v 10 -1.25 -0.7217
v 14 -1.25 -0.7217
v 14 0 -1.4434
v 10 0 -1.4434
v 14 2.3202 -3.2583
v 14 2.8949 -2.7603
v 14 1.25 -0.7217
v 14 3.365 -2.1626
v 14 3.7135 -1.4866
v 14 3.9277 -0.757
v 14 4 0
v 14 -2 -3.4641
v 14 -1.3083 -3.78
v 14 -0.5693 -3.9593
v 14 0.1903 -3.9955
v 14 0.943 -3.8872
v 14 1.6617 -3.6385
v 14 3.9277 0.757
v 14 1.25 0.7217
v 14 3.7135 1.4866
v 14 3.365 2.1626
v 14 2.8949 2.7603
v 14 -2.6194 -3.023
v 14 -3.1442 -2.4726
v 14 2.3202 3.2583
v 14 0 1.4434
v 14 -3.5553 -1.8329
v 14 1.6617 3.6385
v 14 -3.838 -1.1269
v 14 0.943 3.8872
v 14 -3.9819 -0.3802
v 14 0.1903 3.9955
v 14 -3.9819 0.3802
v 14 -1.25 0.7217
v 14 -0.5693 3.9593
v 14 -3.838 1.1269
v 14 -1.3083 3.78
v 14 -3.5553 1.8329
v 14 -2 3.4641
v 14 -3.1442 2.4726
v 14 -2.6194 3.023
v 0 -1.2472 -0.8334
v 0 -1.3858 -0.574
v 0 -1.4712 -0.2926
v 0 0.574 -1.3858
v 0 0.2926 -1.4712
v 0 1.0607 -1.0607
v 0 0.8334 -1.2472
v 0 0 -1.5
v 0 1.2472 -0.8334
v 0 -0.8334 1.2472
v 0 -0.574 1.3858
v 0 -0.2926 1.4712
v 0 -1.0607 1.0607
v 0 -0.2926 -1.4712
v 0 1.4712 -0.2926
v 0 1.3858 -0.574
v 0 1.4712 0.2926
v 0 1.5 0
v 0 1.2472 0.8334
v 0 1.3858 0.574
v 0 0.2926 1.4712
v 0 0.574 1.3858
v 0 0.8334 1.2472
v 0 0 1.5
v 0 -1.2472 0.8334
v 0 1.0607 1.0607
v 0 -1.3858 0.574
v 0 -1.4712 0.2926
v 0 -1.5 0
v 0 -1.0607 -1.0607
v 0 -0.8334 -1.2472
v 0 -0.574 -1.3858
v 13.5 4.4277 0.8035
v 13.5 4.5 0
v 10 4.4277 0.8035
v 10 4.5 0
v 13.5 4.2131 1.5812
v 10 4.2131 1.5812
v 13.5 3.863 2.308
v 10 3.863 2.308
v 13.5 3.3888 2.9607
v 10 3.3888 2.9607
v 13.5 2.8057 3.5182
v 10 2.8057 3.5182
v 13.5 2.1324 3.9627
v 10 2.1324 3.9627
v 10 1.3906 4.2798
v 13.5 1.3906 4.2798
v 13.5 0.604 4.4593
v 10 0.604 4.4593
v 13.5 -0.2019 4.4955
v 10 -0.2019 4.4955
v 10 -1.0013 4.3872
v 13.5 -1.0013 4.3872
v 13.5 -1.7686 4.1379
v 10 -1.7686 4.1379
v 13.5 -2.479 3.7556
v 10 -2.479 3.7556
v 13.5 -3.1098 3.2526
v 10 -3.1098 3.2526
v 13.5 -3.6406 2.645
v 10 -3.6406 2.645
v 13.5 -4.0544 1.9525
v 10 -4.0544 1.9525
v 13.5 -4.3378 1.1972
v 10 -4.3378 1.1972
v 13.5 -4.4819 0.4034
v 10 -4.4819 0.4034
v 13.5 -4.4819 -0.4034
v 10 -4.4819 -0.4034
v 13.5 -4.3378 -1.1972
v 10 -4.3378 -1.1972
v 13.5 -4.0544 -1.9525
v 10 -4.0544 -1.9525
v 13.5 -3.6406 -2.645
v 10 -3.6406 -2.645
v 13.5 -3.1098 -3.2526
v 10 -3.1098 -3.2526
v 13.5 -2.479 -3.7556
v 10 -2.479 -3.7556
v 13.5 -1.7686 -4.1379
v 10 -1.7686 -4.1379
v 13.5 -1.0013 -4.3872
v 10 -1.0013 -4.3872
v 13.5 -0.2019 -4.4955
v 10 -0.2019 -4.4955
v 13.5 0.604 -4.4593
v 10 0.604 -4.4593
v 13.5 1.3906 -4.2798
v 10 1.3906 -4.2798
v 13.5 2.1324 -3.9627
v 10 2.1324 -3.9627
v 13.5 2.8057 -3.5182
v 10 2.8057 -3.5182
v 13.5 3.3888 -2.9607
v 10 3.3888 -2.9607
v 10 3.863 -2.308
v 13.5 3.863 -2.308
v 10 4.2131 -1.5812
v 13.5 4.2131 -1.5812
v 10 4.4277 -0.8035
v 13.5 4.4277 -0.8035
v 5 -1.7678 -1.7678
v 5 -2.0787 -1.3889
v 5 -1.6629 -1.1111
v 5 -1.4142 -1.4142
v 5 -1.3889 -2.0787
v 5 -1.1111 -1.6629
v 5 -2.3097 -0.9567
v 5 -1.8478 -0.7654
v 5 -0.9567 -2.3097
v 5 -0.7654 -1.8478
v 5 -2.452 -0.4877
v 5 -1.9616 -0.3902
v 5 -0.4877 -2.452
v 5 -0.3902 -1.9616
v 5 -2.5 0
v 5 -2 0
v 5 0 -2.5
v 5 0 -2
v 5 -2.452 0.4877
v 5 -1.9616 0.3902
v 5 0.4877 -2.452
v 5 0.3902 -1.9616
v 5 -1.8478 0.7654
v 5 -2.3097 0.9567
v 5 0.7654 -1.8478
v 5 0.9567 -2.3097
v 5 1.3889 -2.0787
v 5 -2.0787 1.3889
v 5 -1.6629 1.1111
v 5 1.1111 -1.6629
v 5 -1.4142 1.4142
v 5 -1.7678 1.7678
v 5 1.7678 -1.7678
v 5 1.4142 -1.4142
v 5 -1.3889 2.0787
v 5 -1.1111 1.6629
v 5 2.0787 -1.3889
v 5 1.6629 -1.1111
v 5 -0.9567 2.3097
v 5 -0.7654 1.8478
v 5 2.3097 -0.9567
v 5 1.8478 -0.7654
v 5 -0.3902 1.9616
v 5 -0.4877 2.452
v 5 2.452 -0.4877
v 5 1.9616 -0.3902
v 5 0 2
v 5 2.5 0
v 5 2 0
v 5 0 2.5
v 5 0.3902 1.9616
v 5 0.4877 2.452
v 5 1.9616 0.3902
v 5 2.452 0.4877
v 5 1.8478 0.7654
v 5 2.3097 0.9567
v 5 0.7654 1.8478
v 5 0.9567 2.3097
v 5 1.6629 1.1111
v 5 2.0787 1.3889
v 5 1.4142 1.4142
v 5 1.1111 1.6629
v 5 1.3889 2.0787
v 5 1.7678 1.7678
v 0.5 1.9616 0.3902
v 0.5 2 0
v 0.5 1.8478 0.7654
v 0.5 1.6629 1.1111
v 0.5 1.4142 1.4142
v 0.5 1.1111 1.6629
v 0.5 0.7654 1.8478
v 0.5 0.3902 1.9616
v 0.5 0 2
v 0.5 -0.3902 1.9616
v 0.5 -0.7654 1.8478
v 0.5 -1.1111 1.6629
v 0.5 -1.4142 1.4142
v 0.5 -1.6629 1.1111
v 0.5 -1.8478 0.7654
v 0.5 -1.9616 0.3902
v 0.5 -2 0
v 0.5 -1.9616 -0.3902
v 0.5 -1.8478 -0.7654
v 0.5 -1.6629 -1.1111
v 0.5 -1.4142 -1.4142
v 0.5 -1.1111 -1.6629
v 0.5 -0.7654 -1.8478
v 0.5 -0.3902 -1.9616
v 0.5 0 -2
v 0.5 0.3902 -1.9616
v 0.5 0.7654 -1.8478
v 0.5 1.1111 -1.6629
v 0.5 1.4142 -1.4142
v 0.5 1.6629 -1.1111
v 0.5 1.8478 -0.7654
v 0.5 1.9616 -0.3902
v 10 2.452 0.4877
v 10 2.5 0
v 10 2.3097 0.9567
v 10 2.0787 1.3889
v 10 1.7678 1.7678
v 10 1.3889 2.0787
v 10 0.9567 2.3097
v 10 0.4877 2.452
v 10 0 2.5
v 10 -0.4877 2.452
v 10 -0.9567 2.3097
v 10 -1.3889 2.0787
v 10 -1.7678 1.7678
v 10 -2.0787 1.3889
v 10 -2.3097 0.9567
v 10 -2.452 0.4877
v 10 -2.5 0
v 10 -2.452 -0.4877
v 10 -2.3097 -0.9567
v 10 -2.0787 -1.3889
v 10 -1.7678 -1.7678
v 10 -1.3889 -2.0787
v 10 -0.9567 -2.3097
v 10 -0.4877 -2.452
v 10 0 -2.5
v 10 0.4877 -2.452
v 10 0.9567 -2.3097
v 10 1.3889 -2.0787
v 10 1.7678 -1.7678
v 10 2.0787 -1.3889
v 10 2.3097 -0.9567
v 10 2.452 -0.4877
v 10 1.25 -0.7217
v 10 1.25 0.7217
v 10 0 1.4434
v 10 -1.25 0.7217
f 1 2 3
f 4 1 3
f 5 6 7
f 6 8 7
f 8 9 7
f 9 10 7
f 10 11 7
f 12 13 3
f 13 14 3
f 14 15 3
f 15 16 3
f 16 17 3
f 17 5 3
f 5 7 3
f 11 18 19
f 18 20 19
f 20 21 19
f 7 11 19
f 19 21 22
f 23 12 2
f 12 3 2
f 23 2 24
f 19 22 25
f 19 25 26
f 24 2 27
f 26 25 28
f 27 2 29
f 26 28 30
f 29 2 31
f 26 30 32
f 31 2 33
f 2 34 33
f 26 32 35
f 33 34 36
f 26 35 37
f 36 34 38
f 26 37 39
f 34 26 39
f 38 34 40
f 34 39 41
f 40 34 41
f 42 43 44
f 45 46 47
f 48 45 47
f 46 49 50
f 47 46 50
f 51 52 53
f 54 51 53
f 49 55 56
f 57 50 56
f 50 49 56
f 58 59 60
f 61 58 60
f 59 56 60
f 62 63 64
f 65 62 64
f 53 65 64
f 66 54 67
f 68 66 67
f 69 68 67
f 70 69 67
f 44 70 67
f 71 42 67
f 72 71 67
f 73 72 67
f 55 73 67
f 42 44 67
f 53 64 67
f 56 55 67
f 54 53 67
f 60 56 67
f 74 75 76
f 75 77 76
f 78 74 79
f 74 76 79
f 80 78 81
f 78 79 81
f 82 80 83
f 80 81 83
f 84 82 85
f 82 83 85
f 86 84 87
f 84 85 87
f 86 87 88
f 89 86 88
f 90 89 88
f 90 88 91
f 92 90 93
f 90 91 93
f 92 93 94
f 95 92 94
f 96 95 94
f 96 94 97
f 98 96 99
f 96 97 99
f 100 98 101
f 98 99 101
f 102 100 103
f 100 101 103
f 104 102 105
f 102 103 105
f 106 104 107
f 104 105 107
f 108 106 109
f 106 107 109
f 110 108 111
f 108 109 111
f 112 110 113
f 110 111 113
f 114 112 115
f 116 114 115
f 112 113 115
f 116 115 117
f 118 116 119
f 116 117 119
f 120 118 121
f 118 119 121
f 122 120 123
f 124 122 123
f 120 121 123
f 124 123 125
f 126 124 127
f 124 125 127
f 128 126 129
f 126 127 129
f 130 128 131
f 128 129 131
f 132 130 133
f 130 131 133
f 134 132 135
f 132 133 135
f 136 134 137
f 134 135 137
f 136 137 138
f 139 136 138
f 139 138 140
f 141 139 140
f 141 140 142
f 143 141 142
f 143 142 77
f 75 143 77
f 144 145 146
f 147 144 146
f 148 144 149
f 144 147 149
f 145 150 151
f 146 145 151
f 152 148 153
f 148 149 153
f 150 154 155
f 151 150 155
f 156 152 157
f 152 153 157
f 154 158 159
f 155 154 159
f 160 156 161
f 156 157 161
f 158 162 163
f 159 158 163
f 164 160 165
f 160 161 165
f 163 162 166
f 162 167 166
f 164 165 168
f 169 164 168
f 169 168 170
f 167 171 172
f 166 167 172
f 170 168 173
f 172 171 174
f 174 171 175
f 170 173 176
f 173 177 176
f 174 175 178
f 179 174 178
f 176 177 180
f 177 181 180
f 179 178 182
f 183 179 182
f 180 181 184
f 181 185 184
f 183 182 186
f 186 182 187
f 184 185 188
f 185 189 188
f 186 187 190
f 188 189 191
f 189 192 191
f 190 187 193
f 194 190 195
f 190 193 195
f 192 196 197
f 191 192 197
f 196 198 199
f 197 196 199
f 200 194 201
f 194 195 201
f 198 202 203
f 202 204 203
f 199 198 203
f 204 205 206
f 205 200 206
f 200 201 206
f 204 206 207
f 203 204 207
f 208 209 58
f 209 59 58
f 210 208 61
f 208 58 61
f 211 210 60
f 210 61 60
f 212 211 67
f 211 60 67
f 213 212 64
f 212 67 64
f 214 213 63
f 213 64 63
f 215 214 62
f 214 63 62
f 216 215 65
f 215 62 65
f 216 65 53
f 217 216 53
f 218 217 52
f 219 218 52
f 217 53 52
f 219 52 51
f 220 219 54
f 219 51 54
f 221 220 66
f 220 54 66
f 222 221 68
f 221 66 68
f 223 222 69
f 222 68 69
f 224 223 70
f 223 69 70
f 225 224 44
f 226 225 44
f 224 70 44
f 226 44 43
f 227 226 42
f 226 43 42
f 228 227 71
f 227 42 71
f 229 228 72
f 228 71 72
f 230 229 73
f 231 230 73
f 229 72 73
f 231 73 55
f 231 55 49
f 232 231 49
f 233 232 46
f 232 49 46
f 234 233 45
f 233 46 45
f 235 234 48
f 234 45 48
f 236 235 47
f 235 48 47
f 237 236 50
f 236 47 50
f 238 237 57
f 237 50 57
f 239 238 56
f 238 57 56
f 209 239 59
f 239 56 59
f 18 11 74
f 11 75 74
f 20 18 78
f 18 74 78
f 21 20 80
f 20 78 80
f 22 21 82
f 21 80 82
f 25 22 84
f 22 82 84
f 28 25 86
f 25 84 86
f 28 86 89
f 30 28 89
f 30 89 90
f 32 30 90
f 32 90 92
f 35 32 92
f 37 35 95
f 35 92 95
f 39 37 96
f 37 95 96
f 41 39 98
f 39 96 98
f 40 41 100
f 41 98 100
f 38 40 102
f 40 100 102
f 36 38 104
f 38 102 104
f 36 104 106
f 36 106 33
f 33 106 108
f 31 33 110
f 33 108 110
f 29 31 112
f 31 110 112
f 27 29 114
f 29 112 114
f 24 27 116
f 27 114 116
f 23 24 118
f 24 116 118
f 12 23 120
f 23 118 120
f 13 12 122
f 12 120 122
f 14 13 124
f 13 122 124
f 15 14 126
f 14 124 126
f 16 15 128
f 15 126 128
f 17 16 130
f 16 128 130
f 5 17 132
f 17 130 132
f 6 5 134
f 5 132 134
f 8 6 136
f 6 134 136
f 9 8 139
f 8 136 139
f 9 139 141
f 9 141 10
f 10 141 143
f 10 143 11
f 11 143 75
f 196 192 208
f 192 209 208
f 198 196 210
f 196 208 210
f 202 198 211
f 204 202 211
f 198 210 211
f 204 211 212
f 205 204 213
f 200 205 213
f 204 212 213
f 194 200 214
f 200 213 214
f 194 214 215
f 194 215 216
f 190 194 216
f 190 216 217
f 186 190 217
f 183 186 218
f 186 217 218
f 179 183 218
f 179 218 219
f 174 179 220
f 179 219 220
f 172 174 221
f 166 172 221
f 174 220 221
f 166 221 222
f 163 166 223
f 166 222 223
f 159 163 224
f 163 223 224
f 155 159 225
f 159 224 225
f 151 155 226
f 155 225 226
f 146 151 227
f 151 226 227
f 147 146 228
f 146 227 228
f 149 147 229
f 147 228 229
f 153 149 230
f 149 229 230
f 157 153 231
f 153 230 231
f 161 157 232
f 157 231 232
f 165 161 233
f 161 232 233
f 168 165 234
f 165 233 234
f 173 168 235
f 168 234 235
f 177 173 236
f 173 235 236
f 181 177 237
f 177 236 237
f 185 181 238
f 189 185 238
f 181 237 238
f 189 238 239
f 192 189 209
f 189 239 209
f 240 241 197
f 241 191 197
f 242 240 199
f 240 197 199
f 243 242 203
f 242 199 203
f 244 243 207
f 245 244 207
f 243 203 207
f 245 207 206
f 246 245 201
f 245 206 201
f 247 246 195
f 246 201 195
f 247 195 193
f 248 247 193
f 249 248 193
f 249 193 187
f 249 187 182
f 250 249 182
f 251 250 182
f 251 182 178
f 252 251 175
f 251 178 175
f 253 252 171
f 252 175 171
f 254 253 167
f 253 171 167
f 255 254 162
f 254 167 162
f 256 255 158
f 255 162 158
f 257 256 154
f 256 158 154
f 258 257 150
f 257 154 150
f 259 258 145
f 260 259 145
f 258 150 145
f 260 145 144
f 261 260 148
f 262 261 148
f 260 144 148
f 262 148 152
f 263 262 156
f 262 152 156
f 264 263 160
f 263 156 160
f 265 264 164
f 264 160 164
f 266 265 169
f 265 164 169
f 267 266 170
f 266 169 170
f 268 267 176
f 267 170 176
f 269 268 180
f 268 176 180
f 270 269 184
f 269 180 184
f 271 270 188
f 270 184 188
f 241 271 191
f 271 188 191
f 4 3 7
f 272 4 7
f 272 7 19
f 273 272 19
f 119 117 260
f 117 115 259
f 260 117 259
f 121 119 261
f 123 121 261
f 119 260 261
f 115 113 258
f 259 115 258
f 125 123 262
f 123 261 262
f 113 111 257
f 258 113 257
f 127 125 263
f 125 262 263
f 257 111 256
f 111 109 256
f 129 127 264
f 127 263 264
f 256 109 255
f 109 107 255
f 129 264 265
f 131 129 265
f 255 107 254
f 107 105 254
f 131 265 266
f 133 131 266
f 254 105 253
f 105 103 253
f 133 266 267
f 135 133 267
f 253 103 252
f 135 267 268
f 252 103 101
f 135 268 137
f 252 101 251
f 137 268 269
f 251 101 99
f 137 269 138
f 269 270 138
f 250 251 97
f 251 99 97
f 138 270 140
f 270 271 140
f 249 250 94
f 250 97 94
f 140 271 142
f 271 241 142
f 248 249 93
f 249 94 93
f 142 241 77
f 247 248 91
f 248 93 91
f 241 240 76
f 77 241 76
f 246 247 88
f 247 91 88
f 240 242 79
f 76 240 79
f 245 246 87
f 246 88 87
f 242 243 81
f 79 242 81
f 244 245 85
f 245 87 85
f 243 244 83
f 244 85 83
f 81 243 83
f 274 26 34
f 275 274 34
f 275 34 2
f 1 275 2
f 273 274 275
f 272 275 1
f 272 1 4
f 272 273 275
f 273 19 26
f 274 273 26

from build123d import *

# Parameters (mm, degrees)
CUT_EXTRUDE1_DEPTH = 4


with BuildPart() as part:
    # Sketch1 → Revolve1 (revolve)
    with BuildSketch(Plane.XY):
        Polygon((0, 0), (14, 0), (14, 4), (13.5, 4.5), (10, 4.5), (10, 2.5), (5, 2.5), (5, 2), (0.5, 2), (0, 1.5), align=None)
    revolve(axis=Axis((0, 0, 0), (1, 0, 0)))

    # Sketch2 → Cut-Extrude1 (cut)
    with BuildSketch(Plane(origin=(14, 0, 0), x_dir=(0, 0, -1), z_dir=(1, 0, 0))):
        Polygon((1.443375673, 0), (0.721687836, 1.25), (-0.721687836, 1.25), (-1.443375673, 0), (-0.721687836, -1.25), (0.721687836, -1.25), align=None)
    extrude(amount=-CUT_EXTRUDE1_DEPTH, mode=Mode.SUBTRACT)


solid = part.part
